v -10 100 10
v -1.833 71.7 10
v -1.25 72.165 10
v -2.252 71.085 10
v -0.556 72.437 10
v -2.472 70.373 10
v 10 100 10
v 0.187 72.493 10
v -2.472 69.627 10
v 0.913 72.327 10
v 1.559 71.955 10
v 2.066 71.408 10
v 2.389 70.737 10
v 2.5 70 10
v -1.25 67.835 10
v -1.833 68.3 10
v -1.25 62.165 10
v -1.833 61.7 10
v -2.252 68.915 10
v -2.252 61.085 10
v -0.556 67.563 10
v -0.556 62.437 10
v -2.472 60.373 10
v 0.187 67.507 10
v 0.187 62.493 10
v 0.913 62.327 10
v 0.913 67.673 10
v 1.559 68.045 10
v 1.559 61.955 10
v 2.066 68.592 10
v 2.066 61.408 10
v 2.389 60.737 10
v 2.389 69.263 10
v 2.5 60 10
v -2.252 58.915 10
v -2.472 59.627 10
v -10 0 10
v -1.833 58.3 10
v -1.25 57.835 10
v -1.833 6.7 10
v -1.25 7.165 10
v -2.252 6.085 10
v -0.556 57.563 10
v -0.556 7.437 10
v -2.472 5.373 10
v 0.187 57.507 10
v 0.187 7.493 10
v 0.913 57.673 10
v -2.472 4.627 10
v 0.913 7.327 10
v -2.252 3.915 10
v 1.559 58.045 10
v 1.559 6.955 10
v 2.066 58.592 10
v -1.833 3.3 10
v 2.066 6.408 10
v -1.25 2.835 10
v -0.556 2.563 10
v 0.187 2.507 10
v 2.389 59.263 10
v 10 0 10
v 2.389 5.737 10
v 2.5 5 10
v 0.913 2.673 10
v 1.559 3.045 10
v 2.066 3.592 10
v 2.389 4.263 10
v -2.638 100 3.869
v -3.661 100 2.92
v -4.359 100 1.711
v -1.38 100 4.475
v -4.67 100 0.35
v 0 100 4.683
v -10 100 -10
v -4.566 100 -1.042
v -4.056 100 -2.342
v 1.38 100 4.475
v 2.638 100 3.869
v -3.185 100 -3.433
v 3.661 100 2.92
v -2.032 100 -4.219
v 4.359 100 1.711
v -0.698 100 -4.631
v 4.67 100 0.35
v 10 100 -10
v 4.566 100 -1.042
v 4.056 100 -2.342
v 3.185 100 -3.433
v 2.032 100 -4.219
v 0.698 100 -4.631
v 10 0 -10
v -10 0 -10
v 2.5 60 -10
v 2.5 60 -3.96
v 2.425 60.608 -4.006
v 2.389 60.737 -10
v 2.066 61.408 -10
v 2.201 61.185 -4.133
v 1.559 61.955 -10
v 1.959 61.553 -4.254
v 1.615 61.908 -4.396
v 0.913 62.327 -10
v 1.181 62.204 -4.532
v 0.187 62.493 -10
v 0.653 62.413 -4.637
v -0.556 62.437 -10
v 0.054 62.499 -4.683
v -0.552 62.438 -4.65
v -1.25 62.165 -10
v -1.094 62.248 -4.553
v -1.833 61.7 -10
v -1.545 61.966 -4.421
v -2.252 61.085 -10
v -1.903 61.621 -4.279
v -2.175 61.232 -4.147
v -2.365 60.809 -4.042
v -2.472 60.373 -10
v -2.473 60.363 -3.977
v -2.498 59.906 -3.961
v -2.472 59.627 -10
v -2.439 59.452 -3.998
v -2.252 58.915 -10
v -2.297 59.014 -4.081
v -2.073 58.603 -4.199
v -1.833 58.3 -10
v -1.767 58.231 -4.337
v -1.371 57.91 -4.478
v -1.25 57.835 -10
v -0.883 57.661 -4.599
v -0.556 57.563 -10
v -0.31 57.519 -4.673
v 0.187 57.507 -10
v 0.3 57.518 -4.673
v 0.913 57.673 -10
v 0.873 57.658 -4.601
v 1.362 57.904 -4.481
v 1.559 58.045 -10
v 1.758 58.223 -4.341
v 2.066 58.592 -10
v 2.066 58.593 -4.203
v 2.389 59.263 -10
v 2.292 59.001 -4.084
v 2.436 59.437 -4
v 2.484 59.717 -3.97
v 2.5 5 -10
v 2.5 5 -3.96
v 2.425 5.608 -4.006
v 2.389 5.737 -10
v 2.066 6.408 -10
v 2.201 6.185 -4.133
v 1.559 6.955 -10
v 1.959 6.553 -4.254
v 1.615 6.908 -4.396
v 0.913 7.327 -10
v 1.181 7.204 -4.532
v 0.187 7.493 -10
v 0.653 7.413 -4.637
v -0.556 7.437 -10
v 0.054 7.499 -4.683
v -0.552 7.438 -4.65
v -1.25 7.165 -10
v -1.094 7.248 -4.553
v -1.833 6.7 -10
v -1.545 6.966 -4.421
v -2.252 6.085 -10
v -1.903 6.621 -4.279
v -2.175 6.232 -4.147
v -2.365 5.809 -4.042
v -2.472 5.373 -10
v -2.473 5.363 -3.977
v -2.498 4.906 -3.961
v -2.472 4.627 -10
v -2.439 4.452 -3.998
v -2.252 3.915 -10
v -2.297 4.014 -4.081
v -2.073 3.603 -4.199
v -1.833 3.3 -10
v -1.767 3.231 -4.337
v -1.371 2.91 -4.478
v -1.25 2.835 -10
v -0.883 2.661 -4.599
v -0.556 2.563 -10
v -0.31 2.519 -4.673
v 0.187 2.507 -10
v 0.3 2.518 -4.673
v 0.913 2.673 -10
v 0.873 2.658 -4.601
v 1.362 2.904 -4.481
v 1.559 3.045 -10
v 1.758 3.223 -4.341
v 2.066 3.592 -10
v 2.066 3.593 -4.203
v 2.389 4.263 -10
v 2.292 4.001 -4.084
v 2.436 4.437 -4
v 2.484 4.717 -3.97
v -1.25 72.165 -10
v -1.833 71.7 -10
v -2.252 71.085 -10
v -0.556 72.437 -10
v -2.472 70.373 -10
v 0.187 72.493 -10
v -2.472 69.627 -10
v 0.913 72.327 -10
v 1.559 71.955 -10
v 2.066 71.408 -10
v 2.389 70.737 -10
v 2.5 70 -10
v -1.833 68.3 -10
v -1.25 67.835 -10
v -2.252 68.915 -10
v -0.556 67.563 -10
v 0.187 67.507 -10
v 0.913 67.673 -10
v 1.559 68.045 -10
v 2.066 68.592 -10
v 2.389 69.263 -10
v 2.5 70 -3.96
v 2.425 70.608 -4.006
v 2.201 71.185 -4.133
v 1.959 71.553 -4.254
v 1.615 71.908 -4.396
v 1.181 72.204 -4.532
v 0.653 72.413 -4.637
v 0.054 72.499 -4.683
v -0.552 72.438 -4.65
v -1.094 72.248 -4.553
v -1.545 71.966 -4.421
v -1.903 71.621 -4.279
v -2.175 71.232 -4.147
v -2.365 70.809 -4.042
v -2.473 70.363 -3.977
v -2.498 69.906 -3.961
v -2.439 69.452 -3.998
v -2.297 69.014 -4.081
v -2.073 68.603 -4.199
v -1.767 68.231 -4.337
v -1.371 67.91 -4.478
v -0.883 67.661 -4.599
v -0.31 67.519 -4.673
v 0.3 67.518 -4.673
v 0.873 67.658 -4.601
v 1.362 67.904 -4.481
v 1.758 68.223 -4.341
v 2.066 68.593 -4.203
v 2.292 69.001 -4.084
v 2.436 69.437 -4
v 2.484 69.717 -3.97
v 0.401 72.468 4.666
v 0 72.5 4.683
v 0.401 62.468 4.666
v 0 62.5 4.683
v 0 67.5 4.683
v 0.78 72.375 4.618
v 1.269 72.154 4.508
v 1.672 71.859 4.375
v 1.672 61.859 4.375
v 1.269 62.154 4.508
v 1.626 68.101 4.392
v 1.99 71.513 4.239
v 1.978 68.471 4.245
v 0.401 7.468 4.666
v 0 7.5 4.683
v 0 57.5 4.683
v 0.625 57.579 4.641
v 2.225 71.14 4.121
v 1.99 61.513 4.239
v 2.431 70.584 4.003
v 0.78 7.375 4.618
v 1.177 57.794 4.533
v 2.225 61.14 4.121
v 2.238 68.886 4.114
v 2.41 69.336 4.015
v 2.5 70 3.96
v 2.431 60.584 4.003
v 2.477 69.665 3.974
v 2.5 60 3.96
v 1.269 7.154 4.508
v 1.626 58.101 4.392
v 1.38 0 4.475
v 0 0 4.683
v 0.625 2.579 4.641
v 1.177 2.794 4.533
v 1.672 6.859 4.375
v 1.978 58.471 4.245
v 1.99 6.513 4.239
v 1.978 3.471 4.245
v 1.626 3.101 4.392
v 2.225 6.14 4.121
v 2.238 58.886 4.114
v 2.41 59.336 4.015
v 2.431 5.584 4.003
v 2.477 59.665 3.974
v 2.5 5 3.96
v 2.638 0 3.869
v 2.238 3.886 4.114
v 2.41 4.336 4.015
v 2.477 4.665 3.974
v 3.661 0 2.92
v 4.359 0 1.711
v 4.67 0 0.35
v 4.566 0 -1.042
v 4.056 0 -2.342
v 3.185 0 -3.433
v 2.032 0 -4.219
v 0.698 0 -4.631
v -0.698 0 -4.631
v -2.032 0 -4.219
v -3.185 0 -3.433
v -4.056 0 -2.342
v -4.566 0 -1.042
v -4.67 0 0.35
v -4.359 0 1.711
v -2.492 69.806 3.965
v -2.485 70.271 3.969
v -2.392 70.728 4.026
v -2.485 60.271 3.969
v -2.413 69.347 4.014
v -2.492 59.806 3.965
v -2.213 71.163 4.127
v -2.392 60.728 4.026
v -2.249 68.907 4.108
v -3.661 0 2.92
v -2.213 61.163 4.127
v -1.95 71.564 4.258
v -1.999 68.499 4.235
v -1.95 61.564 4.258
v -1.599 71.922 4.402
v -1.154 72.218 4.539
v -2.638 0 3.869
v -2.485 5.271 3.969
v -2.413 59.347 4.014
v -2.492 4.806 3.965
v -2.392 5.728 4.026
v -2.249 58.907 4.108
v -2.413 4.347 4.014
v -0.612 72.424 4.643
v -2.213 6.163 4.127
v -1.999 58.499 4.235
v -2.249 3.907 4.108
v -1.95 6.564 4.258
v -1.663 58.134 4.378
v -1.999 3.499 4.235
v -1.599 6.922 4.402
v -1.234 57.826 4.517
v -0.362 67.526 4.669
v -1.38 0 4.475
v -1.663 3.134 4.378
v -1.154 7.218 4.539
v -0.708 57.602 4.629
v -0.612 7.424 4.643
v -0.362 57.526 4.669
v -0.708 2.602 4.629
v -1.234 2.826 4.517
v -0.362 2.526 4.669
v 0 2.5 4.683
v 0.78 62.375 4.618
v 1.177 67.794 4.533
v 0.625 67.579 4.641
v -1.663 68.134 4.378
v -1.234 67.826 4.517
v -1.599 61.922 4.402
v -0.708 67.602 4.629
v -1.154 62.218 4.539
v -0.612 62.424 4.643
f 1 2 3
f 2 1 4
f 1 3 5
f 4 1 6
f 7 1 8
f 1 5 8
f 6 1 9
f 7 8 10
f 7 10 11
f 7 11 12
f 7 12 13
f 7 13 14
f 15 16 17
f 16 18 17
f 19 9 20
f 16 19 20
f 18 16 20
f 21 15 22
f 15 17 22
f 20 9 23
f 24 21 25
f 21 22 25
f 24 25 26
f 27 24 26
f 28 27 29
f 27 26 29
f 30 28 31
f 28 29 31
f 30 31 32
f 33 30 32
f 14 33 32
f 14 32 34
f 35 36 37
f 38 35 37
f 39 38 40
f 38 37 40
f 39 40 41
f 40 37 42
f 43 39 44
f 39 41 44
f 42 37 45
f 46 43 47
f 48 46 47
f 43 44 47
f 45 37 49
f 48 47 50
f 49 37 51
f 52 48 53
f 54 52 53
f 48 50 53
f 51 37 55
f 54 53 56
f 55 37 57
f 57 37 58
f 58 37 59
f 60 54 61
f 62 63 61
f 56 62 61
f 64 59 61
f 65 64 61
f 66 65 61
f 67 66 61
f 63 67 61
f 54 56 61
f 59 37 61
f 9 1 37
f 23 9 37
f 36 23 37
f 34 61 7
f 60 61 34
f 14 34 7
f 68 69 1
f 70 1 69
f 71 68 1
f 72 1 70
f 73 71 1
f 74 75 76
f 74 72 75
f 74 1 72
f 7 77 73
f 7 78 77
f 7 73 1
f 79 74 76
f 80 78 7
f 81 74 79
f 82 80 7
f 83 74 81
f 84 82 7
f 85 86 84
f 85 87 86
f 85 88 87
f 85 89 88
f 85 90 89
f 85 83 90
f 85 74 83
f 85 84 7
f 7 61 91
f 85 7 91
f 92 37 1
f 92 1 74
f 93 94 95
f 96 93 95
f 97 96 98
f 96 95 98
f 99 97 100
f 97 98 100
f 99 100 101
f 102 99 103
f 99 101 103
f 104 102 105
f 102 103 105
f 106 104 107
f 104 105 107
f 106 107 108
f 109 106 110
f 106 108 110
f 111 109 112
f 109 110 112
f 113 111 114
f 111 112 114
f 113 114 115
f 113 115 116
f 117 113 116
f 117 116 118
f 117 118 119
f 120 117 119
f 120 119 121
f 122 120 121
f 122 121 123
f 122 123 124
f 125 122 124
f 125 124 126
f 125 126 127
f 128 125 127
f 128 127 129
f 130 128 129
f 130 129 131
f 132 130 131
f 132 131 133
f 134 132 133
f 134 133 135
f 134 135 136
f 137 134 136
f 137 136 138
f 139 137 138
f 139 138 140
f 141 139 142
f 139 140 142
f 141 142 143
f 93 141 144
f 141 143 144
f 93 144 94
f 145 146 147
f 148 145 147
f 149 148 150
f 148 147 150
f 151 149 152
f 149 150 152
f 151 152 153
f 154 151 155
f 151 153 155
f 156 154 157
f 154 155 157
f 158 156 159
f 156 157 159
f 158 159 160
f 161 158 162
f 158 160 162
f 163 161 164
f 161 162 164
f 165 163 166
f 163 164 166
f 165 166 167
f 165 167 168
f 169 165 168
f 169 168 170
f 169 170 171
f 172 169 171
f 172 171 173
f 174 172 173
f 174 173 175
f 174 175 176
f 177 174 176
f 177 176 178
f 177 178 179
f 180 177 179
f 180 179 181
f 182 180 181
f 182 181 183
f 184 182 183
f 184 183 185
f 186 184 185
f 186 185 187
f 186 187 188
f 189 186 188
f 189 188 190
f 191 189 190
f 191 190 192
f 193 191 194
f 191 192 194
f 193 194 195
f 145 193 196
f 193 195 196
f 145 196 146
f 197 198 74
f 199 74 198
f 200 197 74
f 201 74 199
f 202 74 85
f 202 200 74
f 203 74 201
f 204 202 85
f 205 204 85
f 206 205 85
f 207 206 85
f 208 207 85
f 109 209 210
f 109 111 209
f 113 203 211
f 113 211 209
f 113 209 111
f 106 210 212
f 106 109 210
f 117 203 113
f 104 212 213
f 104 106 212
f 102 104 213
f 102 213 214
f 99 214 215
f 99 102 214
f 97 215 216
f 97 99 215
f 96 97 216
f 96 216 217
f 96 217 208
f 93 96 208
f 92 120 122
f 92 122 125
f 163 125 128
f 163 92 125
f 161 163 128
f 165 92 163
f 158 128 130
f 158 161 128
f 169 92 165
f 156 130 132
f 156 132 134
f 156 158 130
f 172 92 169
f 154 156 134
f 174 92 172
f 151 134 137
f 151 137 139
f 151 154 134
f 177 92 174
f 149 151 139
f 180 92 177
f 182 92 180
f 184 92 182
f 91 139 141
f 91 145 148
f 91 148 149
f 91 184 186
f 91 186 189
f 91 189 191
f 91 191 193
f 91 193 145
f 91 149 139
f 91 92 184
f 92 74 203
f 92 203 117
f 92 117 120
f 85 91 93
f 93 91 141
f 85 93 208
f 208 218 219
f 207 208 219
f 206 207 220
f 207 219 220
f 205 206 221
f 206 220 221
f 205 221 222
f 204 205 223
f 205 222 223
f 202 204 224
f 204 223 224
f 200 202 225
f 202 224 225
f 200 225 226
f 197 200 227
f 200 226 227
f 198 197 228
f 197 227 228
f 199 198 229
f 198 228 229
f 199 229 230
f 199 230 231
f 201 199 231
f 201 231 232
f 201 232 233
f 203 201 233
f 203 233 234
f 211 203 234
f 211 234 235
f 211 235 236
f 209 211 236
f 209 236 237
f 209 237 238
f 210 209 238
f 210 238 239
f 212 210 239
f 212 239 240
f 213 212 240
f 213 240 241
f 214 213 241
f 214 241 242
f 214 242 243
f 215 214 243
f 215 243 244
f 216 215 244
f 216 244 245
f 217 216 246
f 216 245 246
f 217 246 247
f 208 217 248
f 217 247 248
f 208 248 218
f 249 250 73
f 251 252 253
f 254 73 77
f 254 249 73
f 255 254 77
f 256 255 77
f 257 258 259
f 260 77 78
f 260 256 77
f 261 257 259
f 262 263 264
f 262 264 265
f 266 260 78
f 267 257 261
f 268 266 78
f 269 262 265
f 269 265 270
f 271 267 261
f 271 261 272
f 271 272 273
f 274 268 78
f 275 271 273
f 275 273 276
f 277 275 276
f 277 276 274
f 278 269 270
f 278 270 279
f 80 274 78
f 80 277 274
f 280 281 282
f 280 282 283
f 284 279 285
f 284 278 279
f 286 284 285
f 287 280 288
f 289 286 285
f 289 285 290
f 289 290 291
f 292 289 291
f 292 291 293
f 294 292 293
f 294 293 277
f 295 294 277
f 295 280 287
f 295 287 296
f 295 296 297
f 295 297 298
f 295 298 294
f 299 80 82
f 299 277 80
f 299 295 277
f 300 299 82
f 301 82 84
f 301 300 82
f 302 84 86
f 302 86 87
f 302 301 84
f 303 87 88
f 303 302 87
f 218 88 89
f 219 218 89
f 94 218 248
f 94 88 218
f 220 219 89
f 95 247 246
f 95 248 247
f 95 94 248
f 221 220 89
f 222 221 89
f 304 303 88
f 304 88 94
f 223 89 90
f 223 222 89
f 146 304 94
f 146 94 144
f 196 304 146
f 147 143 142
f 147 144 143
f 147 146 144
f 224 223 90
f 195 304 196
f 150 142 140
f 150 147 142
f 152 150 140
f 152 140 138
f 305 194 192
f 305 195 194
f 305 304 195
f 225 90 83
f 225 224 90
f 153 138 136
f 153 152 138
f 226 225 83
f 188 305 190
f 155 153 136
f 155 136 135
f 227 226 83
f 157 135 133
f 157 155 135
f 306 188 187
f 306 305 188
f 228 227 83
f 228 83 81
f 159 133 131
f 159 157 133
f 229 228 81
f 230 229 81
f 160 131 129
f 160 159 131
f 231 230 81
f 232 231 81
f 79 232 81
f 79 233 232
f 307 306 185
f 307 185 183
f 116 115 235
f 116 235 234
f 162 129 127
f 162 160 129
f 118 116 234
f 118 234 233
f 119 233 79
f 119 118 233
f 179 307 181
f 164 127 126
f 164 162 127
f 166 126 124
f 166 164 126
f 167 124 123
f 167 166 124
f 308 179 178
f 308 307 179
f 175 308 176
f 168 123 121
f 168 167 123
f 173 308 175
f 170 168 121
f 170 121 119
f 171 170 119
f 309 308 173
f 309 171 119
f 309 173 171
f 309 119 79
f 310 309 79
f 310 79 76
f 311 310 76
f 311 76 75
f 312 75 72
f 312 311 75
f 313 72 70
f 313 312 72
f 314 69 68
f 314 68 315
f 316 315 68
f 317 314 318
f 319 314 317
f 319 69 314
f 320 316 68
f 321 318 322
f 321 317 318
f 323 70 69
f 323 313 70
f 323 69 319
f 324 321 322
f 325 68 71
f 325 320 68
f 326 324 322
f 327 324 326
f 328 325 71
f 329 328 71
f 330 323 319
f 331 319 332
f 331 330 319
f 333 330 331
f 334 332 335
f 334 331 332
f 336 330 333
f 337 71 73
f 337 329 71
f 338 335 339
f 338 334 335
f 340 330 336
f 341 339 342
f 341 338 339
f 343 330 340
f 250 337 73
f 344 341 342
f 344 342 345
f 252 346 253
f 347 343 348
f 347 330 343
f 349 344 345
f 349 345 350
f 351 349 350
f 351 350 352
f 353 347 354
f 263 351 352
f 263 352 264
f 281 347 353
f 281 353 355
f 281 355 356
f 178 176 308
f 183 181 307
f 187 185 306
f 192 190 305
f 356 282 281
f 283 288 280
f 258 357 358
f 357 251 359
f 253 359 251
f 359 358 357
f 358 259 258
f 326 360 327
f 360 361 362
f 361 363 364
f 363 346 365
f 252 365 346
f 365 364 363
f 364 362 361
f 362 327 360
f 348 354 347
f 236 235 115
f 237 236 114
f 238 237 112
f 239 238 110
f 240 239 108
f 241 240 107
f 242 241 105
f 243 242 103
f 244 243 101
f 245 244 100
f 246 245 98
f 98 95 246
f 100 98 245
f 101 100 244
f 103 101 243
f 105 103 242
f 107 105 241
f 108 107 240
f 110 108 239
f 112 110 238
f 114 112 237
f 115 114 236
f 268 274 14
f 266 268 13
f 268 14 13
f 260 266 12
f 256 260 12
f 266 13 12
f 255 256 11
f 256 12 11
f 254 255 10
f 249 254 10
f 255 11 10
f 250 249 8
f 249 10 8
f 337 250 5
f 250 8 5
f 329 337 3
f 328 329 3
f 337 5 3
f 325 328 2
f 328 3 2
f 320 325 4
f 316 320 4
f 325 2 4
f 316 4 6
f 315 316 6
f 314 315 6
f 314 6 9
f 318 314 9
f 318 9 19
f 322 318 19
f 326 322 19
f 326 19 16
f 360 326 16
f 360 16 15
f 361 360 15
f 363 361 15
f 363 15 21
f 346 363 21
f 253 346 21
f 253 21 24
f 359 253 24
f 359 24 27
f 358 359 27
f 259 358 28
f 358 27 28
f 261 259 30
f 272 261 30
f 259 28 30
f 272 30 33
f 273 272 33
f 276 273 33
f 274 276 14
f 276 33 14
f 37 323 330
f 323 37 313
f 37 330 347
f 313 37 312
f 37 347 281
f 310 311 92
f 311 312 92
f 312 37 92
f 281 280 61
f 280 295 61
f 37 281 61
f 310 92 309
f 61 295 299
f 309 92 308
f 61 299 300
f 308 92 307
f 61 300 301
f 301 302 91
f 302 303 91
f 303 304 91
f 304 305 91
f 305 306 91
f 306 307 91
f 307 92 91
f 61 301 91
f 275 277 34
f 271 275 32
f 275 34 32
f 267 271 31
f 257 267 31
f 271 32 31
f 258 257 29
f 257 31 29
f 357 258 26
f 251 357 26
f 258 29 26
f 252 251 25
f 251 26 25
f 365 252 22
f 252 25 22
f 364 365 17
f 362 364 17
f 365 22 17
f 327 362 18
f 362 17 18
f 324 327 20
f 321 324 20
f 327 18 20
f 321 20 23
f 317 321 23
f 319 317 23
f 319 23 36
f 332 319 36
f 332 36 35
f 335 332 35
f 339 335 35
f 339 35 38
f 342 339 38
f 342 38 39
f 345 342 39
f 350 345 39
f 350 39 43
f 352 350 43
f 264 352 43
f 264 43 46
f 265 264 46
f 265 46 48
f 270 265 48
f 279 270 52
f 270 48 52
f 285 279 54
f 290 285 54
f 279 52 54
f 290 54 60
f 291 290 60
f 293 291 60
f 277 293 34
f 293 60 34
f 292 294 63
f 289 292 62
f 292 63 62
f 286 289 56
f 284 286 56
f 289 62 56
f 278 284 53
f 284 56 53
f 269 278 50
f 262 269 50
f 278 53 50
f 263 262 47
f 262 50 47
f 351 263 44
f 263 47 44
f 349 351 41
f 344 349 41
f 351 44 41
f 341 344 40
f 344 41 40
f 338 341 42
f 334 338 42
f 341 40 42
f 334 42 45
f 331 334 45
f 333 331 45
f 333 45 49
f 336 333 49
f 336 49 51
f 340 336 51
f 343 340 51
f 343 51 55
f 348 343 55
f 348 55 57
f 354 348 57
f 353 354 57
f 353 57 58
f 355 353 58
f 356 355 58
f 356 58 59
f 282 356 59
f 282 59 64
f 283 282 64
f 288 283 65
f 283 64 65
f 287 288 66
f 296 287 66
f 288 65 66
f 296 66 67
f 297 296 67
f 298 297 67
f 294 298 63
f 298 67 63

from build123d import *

# Parameters (mm, degrees)
SKETCH1_W           = 20
SKETCH1_H           = 20
SKETCH1_R           = 4.683092763
BOSS_EXTRUDE1_DEPTH = 100
SKETCH2_R           = 2.5
CUT_EXTRUDE1_DEPTH  = 100
SKETCH3_R           = 2.5
CUT_EXTRUDE2_DEPTH  = 103.469507777


with BuildPart() as part:
    # Sketch1 → Boss-Extrude1 (new body)
    with BuildSketch(Plane(origin=(0, 0, 0), x_dir=(1, 0, 0), z_dir=(0, 1, 0))):
        Rectangle(SKETCH1_W, SKETCH1_H)
        with Locations(Location((0, 0, 0), (0, 0, 270))):
            Circle(SKETCH1_R, mode=Mode.SUBTRACT)
    extrude(amount=BOSS_EXTRUDE1_DEPTH)

    # Sketch2 → Cut-Extrude1 (cut)
    with BuildSketch(Plane.XY.offset(10)):
        with Locations((0, 5)):
            Circle(SKETCH2_R)
    extrude(amount=-CUT_EXTRUDE1_DEPTH, mode=Mode.SUBTRACT)

    # Sketch3 → Cut-Extrude2 (cut, through all)
    with BuildSketch(Plane.XY.offset(10)):
        with Locations((0, 60)):
            Circle(SKETCH3_R)
        with Locations((0, 70)):
            Circle(SKETCH3_R)
    extrude(amount=-CUT_EXTRUDE2_DEPTH, mode=Mode.SUBTRACT)


solid = part.part
